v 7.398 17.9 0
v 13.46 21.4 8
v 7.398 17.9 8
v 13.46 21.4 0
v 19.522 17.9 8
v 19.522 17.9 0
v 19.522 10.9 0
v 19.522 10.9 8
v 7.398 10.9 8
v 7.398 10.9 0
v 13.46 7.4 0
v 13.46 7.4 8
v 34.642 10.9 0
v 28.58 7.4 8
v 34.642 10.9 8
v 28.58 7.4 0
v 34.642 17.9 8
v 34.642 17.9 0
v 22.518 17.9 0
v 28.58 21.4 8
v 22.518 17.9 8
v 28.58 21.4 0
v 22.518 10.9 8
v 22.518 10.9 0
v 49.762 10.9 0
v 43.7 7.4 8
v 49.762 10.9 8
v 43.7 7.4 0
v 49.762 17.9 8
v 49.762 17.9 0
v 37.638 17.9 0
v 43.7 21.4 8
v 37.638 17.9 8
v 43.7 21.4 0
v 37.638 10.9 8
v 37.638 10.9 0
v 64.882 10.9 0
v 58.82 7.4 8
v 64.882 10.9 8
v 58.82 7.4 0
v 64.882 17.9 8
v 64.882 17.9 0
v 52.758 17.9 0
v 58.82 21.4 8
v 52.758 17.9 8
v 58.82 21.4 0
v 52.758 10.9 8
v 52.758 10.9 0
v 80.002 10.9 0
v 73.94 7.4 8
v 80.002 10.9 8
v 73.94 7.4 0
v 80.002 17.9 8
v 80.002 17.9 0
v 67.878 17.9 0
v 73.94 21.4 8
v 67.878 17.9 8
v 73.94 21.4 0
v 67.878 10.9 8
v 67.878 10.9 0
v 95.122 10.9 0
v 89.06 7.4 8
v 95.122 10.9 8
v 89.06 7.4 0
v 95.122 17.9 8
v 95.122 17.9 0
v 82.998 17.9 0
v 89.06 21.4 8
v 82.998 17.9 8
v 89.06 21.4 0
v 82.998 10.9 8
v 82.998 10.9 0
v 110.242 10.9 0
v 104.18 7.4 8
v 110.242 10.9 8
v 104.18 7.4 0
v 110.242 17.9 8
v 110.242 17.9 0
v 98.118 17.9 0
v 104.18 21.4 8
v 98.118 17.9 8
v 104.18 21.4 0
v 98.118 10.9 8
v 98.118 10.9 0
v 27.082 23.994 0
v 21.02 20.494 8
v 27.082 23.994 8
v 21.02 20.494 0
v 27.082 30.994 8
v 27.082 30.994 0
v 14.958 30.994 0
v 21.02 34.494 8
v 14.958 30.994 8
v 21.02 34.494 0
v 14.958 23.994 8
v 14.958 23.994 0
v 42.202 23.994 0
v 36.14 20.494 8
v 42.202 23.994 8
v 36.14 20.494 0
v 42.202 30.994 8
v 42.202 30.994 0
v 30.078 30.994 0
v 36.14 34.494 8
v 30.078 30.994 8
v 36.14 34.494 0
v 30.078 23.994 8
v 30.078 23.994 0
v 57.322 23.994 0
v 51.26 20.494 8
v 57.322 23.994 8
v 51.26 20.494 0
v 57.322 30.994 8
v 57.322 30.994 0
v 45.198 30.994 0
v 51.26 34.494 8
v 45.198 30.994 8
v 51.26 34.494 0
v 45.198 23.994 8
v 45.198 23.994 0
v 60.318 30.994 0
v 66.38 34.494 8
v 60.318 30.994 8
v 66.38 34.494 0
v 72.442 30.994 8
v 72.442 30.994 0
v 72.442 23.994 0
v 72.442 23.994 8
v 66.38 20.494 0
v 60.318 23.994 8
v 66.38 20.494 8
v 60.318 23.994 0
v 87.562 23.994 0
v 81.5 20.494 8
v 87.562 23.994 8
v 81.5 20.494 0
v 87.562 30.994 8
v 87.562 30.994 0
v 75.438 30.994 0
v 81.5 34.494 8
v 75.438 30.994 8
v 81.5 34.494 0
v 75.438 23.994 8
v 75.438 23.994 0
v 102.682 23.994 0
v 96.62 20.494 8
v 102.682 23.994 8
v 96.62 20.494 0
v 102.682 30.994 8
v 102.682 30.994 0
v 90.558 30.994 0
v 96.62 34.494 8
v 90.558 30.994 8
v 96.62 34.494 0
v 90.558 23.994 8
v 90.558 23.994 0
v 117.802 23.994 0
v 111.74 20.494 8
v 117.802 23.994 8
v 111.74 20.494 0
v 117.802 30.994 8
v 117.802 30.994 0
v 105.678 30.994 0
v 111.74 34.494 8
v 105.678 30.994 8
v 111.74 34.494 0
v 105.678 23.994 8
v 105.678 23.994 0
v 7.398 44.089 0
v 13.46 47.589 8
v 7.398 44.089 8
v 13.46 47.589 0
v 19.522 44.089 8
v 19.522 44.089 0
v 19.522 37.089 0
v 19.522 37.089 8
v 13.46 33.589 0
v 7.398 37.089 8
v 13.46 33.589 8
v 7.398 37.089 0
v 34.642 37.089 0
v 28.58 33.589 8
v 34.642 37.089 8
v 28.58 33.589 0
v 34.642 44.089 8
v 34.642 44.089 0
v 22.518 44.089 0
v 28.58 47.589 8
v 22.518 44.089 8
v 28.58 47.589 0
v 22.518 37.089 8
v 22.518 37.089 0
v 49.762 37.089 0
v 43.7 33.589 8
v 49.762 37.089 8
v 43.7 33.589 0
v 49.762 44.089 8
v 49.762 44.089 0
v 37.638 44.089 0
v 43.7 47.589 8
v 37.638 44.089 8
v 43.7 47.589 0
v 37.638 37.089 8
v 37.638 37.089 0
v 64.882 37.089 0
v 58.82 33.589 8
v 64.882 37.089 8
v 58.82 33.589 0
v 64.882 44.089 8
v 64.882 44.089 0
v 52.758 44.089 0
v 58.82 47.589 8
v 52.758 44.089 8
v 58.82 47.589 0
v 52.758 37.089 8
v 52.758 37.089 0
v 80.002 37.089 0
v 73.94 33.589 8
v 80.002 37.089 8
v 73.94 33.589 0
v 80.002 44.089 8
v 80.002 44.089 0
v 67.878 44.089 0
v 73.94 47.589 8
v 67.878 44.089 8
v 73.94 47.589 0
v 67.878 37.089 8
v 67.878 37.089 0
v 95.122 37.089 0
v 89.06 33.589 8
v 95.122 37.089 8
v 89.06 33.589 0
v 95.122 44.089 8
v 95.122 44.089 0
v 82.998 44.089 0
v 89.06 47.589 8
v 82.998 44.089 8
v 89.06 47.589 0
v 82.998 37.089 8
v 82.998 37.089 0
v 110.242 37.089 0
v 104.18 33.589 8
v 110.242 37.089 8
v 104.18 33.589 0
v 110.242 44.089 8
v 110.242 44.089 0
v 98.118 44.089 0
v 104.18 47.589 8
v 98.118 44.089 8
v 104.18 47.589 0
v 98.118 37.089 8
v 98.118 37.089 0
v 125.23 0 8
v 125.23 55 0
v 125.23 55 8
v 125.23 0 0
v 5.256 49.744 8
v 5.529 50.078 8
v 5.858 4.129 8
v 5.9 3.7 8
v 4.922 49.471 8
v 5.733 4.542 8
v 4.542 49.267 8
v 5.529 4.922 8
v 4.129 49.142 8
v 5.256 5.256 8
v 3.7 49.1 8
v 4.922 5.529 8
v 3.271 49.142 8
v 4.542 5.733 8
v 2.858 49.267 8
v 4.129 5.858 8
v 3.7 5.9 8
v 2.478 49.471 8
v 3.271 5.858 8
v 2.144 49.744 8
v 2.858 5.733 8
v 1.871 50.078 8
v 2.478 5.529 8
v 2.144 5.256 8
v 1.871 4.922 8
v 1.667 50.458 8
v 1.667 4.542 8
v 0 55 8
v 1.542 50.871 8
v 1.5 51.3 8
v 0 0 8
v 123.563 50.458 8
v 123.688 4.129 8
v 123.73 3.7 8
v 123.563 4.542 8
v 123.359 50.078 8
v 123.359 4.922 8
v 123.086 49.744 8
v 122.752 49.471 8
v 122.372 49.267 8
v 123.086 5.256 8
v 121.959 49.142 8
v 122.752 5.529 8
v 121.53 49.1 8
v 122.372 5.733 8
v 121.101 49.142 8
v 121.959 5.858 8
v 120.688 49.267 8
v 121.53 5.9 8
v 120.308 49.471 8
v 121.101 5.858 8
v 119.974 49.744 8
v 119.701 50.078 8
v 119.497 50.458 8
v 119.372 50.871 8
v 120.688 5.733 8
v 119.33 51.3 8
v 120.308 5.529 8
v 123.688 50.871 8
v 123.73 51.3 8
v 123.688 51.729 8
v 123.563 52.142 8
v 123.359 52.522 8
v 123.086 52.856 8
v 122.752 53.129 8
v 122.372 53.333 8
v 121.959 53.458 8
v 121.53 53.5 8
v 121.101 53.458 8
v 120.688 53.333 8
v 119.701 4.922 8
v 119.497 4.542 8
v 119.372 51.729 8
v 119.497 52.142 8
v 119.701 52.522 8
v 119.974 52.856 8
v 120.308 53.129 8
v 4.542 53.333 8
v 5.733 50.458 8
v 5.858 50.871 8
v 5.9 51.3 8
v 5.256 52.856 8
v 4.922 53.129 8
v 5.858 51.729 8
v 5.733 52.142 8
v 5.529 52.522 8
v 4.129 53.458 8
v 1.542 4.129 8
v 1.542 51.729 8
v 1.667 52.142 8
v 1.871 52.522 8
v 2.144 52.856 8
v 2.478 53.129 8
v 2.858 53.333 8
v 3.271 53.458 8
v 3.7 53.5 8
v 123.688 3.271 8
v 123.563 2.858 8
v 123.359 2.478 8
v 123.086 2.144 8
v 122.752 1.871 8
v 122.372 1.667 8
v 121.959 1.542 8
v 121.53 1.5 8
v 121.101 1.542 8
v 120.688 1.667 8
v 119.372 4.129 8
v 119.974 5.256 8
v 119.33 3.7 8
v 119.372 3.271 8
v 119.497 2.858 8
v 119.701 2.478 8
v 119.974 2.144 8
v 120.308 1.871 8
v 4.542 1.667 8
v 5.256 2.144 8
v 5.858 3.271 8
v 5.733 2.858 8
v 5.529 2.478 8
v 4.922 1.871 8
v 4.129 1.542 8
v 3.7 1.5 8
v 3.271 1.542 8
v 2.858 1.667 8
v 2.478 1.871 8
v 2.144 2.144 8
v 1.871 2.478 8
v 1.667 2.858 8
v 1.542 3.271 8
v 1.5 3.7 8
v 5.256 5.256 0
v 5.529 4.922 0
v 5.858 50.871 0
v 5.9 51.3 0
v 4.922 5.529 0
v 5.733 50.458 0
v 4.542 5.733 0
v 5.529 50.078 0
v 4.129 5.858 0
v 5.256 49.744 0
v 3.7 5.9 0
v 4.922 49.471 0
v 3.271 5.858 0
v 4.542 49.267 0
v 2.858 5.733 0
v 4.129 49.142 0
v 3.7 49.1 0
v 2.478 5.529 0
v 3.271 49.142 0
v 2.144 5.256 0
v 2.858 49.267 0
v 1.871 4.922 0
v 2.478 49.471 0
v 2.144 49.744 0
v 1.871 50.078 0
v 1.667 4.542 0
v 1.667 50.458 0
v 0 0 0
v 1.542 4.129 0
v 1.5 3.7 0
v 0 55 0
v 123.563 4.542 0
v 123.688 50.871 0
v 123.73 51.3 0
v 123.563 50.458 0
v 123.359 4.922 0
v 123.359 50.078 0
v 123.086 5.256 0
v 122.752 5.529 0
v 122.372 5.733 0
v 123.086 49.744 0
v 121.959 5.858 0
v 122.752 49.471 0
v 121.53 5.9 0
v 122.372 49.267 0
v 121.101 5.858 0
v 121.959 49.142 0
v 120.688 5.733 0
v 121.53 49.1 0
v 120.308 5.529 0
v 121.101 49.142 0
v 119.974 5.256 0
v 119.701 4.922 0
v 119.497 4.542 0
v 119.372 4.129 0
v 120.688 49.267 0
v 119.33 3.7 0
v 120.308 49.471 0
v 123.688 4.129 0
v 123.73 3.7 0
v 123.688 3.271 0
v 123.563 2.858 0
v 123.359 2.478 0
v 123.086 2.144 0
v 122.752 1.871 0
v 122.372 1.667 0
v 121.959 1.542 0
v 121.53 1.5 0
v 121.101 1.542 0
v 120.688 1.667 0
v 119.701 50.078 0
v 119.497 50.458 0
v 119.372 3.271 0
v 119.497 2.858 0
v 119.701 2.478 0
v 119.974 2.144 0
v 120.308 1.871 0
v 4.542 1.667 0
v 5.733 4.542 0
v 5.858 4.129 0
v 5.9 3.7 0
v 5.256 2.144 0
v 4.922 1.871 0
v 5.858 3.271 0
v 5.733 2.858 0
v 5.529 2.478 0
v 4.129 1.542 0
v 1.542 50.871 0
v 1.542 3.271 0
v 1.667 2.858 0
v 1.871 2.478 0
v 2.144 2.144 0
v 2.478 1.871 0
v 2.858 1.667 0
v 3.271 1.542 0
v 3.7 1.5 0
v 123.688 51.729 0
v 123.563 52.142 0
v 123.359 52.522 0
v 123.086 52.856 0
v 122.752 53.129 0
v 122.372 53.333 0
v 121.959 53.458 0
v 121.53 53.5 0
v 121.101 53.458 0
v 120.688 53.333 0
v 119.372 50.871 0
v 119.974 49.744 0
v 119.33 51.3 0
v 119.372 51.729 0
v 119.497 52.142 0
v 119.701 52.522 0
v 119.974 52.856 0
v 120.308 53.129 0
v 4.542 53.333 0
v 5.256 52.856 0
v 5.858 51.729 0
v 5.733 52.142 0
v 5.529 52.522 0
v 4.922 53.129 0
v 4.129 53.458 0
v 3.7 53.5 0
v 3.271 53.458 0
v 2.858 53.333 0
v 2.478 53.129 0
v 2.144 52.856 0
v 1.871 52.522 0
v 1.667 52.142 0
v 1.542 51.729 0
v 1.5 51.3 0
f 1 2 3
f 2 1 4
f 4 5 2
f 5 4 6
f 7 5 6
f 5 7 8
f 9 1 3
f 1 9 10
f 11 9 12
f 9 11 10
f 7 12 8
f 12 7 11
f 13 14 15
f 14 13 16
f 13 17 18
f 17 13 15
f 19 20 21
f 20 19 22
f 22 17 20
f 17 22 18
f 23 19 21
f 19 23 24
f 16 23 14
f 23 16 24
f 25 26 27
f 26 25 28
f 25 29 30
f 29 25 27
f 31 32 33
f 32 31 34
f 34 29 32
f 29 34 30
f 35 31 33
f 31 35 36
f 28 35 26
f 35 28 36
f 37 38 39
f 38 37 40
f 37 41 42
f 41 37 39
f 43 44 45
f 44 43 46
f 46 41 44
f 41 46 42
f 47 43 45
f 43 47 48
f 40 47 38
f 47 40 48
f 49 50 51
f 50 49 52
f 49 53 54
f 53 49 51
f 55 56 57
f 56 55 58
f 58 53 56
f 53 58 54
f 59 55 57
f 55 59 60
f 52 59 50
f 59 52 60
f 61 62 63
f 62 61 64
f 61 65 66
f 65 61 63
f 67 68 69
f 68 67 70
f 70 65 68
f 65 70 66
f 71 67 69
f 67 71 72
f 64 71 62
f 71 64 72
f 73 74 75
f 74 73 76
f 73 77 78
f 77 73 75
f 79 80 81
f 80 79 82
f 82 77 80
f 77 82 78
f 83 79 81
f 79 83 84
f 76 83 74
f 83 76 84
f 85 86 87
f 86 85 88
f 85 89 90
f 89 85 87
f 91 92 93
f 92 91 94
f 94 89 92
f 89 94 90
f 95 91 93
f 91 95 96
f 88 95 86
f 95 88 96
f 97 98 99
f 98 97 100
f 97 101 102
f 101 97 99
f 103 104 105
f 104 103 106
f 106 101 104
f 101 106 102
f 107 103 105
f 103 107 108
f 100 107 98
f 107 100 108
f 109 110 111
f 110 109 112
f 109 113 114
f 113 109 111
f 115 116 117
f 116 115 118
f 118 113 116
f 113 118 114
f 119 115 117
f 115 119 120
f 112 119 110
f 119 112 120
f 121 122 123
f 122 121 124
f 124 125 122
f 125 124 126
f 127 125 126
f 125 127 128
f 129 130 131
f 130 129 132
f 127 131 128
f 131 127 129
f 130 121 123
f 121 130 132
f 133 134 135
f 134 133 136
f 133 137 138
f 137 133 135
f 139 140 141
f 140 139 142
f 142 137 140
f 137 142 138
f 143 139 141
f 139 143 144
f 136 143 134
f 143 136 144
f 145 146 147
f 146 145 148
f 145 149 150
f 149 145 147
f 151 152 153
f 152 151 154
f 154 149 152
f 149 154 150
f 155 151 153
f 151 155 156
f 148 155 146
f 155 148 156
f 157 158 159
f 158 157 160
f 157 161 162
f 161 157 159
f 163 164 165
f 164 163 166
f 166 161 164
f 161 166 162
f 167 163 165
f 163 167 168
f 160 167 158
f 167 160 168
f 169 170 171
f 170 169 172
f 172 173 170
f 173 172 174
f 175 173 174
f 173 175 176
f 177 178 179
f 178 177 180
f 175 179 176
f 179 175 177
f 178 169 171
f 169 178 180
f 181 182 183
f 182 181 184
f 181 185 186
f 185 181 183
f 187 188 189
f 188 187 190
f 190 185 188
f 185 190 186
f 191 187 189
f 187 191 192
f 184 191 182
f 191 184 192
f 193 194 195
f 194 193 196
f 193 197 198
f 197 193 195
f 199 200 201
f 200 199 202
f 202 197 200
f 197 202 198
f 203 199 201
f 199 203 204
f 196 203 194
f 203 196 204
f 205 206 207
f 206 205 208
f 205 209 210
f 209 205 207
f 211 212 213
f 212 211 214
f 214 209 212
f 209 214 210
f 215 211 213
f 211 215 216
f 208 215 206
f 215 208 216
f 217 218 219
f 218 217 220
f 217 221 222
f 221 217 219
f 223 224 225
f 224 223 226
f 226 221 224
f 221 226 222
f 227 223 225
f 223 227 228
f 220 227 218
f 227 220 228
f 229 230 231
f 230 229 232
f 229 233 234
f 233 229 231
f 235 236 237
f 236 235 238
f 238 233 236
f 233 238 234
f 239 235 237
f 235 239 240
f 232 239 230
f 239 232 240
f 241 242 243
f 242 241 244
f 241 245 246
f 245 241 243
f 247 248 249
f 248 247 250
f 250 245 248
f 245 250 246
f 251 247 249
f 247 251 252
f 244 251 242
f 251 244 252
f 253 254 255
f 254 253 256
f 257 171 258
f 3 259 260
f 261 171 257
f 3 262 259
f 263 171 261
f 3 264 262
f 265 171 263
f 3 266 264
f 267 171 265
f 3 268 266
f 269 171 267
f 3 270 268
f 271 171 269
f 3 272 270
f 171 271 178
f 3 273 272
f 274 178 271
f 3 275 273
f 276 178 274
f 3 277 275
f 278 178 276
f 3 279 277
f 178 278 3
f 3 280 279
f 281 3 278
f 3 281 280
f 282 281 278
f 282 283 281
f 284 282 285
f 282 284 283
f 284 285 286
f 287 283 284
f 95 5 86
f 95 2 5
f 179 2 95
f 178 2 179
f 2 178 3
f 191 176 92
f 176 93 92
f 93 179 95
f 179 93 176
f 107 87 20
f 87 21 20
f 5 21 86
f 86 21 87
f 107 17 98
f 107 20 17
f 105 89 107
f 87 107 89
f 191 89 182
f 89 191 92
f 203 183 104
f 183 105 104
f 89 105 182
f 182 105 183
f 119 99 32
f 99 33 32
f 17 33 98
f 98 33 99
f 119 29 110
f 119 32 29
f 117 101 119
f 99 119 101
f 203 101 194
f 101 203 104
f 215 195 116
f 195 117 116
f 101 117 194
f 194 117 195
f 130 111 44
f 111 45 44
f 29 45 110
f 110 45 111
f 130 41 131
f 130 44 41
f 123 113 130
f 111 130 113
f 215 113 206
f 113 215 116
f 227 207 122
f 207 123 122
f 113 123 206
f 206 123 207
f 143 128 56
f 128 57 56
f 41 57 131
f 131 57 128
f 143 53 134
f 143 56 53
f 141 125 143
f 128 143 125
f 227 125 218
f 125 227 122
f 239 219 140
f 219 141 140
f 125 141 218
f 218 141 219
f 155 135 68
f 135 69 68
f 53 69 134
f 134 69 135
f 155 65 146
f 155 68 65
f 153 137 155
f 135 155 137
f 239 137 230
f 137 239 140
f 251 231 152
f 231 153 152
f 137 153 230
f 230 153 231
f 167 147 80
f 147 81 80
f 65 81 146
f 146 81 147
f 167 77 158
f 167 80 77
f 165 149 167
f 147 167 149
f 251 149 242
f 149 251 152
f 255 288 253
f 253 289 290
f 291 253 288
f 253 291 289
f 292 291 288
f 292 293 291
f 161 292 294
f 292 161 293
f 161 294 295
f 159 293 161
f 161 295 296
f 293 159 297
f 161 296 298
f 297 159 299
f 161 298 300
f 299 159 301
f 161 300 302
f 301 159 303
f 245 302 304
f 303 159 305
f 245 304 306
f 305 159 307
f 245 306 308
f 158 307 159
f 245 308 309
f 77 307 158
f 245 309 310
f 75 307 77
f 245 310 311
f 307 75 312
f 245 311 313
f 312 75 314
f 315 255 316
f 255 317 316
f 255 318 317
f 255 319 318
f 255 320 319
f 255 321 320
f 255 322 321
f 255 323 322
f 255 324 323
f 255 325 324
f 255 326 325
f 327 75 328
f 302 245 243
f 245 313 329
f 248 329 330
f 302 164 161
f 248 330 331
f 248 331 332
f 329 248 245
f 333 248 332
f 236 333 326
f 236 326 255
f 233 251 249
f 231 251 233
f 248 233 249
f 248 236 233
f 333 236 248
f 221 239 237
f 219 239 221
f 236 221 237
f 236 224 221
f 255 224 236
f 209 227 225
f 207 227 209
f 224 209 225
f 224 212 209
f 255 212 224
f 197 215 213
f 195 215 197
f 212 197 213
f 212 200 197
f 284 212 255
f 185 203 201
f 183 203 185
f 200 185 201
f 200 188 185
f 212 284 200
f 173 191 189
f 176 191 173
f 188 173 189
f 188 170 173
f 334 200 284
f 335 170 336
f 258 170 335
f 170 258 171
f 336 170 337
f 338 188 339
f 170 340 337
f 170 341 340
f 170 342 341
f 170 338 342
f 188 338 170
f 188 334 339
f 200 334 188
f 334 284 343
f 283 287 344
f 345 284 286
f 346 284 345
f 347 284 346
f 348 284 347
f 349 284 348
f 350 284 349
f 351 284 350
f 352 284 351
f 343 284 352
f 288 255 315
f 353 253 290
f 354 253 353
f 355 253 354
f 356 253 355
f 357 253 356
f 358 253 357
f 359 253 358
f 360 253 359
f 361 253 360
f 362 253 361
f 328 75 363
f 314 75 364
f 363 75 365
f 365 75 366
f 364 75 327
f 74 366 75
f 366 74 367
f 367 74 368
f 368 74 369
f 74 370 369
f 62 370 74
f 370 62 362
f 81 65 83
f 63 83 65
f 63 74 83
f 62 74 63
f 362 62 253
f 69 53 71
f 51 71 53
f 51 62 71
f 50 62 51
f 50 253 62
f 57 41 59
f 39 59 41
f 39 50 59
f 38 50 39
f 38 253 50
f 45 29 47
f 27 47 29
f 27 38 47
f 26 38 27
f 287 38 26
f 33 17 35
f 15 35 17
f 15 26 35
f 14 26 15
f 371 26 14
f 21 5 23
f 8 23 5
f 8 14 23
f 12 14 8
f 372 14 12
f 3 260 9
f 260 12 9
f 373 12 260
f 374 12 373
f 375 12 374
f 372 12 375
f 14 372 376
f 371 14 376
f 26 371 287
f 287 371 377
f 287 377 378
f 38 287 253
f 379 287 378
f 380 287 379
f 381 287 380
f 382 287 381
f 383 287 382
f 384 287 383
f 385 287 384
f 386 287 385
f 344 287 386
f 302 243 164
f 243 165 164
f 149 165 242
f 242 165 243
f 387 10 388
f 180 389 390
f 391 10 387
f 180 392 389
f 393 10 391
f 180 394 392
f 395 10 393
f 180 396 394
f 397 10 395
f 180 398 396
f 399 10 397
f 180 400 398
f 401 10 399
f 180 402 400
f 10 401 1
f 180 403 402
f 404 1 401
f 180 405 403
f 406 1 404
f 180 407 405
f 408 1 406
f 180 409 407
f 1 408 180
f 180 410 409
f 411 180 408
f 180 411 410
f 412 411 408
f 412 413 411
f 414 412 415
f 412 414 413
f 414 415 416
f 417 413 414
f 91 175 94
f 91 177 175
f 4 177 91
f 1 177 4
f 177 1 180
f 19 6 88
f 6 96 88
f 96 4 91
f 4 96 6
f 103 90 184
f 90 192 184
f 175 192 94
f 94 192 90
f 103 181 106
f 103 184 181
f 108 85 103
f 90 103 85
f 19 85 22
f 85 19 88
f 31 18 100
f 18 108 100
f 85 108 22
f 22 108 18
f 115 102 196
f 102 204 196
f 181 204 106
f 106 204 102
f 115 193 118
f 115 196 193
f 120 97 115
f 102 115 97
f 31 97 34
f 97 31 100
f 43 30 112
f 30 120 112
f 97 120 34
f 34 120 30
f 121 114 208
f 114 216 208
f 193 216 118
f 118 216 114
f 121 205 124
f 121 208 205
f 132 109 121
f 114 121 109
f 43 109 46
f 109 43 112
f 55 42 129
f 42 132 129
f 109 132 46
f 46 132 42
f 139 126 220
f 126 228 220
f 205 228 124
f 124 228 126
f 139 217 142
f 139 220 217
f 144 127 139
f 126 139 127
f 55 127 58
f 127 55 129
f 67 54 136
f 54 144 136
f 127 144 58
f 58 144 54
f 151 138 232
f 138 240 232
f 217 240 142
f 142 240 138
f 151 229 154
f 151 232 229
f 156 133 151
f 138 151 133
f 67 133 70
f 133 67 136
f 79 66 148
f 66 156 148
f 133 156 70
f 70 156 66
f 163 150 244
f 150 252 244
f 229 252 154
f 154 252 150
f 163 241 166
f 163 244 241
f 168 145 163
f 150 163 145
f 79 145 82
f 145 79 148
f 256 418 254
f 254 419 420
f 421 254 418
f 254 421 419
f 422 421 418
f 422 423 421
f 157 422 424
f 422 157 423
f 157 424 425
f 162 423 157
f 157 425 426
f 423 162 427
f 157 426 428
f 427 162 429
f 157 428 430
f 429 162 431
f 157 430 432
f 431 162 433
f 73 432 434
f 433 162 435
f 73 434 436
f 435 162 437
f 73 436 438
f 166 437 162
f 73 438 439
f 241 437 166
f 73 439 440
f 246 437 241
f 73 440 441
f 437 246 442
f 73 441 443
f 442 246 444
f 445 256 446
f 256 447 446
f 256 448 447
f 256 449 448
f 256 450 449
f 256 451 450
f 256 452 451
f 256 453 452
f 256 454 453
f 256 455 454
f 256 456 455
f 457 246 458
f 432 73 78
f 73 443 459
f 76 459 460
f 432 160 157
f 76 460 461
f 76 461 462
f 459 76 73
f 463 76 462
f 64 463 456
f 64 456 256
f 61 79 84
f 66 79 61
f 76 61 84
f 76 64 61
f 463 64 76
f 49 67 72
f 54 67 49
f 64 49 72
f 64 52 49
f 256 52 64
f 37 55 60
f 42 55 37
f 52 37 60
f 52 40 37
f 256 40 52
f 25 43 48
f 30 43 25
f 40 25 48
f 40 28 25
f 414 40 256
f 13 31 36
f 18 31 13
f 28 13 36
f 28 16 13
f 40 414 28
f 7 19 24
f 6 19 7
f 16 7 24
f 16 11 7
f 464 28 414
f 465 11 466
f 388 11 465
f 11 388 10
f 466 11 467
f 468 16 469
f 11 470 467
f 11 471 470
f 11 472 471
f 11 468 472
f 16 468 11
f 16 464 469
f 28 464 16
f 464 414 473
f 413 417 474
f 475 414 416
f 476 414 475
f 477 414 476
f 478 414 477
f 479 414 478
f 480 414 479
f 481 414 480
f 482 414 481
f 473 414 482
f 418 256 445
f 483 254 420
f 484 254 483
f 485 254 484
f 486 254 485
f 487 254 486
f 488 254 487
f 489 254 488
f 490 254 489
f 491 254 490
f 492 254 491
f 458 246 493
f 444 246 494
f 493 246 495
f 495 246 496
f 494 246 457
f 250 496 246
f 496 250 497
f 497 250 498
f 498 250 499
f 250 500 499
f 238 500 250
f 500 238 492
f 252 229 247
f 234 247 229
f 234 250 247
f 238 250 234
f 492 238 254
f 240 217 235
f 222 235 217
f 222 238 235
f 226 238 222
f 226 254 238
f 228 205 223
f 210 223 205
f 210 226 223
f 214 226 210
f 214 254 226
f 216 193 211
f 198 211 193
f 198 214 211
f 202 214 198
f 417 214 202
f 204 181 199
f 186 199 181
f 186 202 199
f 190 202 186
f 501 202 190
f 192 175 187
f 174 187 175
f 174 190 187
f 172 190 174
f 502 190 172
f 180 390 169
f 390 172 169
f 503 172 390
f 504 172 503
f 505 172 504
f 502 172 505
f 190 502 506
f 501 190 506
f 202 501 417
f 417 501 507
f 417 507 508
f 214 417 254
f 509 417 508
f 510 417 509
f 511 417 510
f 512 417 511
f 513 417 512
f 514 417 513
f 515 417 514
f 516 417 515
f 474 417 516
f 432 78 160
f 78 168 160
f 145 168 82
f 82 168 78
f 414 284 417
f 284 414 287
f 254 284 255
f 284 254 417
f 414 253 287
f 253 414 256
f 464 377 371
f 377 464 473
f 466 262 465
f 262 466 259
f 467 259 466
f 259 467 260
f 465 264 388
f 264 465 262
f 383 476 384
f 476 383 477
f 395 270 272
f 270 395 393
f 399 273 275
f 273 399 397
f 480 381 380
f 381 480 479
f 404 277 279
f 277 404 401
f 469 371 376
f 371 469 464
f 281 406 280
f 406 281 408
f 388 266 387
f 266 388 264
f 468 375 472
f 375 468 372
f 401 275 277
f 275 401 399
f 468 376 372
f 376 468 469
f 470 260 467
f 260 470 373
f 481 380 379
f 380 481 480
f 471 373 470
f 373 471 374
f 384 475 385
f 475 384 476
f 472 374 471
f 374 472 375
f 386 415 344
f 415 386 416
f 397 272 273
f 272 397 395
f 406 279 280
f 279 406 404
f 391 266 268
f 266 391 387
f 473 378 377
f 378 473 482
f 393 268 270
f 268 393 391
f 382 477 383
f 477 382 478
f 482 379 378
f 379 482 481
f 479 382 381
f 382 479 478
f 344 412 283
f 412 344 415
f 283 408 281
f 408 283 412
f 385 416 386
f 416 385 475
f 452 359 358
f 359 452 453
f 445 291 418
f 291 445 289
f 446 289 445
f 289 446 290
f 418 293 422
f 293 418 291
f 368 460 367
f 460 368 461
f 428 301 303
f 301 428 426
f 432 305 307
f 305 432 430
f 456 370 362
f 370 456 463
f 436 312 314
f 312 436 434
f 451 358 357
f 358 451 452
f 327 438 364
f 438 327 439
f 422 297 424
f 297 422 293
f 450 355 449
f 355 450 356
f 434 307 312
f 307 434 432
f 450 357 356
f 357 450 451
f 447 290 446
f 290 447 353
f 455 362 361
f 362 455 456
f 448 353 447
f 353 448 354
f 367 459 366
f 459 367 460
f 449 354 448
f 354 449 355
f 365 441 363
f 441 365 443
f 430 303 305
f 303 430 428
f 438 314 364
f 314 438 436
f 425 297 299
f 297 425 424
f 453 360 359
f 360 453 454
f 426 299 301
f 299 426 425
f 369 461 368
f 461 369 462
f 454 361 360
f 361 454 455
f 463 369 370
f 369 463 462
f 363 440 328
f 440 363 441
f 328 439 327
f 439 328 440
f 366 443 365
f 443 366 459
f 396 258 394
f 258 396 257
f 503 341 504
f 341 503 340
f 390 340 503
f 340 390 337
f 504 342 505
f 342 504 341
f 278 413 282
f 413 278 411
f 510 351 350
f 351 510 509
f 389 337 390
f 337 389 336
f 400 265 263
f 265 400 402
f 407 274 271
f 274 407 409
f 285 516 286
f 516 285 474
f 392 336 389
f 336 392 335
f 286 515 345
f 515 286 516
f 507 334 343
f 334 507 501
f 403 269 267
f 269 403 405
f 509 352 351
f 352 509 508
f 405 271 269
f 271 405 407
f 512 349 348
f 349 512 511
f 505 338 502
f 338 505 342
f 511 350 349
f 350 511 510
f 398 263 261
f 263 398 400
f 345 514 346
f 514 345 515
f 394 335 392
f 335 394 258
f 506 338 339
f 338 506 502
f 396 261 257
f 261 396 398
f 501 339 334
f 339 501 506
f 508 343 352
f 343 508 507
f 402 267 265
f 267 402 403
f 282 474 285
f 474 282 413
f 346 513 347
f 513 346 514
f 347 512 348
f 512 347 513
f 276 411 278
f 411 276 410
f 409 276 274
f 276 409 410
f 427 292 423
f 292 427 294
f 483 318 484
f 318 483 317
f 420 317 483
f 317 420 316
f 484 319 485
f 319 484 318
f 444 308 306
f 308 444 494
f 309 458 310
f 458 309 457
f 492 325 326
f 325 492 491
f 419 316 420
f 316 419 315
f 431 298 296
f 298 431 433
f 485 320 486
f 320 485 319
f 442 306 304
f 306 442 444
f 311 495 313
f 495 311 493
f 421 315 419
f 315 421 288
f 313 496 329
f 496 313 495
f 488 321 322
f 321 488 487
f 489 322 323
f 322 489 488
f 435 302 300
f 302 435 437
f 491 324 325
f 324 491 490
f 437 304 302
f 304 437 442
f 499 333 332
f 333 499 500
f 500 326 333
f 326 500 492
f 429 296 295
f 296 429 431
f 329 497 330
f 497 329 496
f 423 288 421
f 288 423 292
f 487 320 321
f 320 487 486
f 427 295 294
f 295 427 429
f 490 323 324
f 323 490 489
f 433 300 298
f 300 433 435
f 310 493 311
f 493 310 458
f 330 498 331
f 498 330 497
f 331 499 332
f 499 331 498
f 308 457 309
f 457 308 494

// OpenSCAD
$fn = 32;

// ----------------------------------------------------------------------
// Honeycomb panel: 125.23 x 55 mm, 21 cells of 14 mm
// ----------------------------------------------------------------------

// --- parameters (mm) ---
panel_w = 125.23;         // panel width
panel_d = 55;             // panel depth
thick = 8;                // panel thickness
cell_r = 7;               // hex cell circumradius
pitch = 15.12;            // hex cell pitch (centre to centre)
web = 3;                  // web between the cells
columns = 7;              // columns of cells
rows = 3;                 // rows of cells
cell_count = 21;          // total cells
shift_x = 13.46;          // first cell offset in x
shift_y = 14.4;           // first cell offset in y
mount_d = 4.4;            // corner mounting holes
hole_off = 3.7;           // mounting hole offset from the corners

difference() {
  union() {
    cube([panel_w, panel_d, thick]);
  }
  /* hexagonal cells, point-up, cut right through the plate */
  for (row = [0 : rows - 1]) {
    for (col = [0 : columns - 1]) {
      translate([shift_x + col * pitch + (row % 2) * pitch / 2, shift_y + row * pitch * 0.866025, -2.5]) rotate([0, 0, 30]) cylinder(h = thick + 5, d = 2 * cell_r, $fn = 6);
    }
  }
  /* corner mounting holes, clear of the outer cell web */
  translate([3.7, 3.7, -2.5]) cylinder(h = thick + 5, d = mount_d);
  translate([121.53, 3.7, -2.5]) cylinder(h = thick + 5, d = mount_d);
  translate([3.7, 51.3, -2.5]) cylinder(h = thick + 5, d = mount_d);
  translate([121.53, 51.3, -2.5]) cylinder(h = thick + 5, d = mount_d);
}
